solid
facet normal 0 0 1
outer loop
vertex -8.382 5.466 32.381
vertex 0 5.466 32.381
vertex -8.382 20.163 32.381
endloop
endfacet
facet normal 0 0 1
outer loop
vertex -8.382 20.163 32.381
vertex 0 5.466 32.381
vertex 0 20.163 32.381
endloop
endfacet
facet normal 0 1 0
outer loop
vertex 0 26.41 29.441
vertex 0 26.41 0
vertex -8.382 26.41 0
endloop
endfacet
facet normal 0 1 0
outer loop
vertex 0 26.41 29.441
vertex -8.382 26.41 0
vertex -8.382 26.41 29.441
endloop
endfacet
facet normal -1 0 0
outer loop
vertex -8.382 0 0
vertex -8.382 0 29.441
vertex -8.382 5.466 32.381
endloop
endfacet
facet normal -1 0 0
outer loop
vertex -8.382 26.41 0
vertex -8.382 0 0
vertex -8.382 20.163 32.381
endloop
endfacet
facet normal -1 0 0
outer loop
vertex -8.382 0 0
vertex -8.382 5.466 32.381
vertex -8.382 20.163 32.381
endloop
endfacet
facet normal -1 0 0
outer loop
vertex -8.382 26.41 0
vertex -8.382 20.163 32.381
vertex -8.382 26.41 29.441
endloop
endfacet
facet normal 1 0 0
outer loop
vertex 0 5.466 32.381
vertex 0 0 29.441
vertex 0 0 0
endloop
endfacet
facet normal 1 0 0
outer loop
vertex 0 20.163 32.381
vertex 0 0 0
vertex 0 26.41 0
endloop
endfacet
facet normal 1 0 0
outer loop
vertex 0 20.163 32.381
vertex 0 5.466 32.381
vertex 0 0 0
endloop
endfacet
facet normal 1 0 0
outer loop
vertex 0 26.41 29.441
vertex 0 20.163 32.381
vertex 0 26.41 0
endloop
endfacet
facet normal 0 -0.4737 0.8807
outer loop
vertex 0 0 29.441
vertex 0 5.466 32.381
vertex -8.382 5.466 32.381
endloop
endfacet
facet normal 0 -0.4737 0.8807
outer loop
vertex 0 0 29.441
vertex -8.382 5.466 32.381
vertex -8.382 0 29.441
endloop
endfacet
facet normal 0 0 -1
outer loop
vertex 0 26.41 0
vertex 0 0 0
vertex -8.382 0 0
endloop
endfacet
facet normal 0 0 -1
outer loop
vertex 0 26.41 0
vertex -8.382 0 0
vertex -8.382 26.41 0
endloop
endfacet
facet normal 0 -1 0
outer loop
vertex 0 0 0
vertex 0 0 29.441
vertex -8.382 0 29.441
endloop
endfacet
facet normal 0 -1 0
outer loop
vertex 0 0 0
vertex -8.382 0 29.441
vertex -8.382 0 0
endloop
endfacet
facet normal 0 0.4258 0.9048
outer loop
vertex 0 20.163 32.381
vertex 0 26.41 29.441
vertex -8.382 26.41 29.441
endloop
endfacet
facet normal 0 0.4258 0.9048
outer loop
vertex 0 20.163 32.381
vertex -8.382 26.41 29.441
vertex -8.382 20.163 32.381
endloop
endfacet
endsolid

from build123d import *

# Parameters (mm, degrees)
F0_W     = 14.6975922398
F0_H     = 32.3806256056
F1_DEPTH = 8.382


with BuildPart() as f1:
    # F0 (on Right) → F1 (new body)
    with BuildSketch(Plane.YZ):
        Polygon((26.4097284526, 29.4411070645), (20.163256675, 32.3806256056), (20.163256675, 0), (26.4097284526, 0), align=None)
        Polygon((5.4656644352, 0), (5.4656644352, 32.3806256056), (0, 29.4411070645), (0, 0), align=None)
        with Locations((12.8144605551, 16.1903128028)):
            Rectangle(F0_W, F0_H)
    extrude(amount=-F1_DEPTH)


solid = f1.part
